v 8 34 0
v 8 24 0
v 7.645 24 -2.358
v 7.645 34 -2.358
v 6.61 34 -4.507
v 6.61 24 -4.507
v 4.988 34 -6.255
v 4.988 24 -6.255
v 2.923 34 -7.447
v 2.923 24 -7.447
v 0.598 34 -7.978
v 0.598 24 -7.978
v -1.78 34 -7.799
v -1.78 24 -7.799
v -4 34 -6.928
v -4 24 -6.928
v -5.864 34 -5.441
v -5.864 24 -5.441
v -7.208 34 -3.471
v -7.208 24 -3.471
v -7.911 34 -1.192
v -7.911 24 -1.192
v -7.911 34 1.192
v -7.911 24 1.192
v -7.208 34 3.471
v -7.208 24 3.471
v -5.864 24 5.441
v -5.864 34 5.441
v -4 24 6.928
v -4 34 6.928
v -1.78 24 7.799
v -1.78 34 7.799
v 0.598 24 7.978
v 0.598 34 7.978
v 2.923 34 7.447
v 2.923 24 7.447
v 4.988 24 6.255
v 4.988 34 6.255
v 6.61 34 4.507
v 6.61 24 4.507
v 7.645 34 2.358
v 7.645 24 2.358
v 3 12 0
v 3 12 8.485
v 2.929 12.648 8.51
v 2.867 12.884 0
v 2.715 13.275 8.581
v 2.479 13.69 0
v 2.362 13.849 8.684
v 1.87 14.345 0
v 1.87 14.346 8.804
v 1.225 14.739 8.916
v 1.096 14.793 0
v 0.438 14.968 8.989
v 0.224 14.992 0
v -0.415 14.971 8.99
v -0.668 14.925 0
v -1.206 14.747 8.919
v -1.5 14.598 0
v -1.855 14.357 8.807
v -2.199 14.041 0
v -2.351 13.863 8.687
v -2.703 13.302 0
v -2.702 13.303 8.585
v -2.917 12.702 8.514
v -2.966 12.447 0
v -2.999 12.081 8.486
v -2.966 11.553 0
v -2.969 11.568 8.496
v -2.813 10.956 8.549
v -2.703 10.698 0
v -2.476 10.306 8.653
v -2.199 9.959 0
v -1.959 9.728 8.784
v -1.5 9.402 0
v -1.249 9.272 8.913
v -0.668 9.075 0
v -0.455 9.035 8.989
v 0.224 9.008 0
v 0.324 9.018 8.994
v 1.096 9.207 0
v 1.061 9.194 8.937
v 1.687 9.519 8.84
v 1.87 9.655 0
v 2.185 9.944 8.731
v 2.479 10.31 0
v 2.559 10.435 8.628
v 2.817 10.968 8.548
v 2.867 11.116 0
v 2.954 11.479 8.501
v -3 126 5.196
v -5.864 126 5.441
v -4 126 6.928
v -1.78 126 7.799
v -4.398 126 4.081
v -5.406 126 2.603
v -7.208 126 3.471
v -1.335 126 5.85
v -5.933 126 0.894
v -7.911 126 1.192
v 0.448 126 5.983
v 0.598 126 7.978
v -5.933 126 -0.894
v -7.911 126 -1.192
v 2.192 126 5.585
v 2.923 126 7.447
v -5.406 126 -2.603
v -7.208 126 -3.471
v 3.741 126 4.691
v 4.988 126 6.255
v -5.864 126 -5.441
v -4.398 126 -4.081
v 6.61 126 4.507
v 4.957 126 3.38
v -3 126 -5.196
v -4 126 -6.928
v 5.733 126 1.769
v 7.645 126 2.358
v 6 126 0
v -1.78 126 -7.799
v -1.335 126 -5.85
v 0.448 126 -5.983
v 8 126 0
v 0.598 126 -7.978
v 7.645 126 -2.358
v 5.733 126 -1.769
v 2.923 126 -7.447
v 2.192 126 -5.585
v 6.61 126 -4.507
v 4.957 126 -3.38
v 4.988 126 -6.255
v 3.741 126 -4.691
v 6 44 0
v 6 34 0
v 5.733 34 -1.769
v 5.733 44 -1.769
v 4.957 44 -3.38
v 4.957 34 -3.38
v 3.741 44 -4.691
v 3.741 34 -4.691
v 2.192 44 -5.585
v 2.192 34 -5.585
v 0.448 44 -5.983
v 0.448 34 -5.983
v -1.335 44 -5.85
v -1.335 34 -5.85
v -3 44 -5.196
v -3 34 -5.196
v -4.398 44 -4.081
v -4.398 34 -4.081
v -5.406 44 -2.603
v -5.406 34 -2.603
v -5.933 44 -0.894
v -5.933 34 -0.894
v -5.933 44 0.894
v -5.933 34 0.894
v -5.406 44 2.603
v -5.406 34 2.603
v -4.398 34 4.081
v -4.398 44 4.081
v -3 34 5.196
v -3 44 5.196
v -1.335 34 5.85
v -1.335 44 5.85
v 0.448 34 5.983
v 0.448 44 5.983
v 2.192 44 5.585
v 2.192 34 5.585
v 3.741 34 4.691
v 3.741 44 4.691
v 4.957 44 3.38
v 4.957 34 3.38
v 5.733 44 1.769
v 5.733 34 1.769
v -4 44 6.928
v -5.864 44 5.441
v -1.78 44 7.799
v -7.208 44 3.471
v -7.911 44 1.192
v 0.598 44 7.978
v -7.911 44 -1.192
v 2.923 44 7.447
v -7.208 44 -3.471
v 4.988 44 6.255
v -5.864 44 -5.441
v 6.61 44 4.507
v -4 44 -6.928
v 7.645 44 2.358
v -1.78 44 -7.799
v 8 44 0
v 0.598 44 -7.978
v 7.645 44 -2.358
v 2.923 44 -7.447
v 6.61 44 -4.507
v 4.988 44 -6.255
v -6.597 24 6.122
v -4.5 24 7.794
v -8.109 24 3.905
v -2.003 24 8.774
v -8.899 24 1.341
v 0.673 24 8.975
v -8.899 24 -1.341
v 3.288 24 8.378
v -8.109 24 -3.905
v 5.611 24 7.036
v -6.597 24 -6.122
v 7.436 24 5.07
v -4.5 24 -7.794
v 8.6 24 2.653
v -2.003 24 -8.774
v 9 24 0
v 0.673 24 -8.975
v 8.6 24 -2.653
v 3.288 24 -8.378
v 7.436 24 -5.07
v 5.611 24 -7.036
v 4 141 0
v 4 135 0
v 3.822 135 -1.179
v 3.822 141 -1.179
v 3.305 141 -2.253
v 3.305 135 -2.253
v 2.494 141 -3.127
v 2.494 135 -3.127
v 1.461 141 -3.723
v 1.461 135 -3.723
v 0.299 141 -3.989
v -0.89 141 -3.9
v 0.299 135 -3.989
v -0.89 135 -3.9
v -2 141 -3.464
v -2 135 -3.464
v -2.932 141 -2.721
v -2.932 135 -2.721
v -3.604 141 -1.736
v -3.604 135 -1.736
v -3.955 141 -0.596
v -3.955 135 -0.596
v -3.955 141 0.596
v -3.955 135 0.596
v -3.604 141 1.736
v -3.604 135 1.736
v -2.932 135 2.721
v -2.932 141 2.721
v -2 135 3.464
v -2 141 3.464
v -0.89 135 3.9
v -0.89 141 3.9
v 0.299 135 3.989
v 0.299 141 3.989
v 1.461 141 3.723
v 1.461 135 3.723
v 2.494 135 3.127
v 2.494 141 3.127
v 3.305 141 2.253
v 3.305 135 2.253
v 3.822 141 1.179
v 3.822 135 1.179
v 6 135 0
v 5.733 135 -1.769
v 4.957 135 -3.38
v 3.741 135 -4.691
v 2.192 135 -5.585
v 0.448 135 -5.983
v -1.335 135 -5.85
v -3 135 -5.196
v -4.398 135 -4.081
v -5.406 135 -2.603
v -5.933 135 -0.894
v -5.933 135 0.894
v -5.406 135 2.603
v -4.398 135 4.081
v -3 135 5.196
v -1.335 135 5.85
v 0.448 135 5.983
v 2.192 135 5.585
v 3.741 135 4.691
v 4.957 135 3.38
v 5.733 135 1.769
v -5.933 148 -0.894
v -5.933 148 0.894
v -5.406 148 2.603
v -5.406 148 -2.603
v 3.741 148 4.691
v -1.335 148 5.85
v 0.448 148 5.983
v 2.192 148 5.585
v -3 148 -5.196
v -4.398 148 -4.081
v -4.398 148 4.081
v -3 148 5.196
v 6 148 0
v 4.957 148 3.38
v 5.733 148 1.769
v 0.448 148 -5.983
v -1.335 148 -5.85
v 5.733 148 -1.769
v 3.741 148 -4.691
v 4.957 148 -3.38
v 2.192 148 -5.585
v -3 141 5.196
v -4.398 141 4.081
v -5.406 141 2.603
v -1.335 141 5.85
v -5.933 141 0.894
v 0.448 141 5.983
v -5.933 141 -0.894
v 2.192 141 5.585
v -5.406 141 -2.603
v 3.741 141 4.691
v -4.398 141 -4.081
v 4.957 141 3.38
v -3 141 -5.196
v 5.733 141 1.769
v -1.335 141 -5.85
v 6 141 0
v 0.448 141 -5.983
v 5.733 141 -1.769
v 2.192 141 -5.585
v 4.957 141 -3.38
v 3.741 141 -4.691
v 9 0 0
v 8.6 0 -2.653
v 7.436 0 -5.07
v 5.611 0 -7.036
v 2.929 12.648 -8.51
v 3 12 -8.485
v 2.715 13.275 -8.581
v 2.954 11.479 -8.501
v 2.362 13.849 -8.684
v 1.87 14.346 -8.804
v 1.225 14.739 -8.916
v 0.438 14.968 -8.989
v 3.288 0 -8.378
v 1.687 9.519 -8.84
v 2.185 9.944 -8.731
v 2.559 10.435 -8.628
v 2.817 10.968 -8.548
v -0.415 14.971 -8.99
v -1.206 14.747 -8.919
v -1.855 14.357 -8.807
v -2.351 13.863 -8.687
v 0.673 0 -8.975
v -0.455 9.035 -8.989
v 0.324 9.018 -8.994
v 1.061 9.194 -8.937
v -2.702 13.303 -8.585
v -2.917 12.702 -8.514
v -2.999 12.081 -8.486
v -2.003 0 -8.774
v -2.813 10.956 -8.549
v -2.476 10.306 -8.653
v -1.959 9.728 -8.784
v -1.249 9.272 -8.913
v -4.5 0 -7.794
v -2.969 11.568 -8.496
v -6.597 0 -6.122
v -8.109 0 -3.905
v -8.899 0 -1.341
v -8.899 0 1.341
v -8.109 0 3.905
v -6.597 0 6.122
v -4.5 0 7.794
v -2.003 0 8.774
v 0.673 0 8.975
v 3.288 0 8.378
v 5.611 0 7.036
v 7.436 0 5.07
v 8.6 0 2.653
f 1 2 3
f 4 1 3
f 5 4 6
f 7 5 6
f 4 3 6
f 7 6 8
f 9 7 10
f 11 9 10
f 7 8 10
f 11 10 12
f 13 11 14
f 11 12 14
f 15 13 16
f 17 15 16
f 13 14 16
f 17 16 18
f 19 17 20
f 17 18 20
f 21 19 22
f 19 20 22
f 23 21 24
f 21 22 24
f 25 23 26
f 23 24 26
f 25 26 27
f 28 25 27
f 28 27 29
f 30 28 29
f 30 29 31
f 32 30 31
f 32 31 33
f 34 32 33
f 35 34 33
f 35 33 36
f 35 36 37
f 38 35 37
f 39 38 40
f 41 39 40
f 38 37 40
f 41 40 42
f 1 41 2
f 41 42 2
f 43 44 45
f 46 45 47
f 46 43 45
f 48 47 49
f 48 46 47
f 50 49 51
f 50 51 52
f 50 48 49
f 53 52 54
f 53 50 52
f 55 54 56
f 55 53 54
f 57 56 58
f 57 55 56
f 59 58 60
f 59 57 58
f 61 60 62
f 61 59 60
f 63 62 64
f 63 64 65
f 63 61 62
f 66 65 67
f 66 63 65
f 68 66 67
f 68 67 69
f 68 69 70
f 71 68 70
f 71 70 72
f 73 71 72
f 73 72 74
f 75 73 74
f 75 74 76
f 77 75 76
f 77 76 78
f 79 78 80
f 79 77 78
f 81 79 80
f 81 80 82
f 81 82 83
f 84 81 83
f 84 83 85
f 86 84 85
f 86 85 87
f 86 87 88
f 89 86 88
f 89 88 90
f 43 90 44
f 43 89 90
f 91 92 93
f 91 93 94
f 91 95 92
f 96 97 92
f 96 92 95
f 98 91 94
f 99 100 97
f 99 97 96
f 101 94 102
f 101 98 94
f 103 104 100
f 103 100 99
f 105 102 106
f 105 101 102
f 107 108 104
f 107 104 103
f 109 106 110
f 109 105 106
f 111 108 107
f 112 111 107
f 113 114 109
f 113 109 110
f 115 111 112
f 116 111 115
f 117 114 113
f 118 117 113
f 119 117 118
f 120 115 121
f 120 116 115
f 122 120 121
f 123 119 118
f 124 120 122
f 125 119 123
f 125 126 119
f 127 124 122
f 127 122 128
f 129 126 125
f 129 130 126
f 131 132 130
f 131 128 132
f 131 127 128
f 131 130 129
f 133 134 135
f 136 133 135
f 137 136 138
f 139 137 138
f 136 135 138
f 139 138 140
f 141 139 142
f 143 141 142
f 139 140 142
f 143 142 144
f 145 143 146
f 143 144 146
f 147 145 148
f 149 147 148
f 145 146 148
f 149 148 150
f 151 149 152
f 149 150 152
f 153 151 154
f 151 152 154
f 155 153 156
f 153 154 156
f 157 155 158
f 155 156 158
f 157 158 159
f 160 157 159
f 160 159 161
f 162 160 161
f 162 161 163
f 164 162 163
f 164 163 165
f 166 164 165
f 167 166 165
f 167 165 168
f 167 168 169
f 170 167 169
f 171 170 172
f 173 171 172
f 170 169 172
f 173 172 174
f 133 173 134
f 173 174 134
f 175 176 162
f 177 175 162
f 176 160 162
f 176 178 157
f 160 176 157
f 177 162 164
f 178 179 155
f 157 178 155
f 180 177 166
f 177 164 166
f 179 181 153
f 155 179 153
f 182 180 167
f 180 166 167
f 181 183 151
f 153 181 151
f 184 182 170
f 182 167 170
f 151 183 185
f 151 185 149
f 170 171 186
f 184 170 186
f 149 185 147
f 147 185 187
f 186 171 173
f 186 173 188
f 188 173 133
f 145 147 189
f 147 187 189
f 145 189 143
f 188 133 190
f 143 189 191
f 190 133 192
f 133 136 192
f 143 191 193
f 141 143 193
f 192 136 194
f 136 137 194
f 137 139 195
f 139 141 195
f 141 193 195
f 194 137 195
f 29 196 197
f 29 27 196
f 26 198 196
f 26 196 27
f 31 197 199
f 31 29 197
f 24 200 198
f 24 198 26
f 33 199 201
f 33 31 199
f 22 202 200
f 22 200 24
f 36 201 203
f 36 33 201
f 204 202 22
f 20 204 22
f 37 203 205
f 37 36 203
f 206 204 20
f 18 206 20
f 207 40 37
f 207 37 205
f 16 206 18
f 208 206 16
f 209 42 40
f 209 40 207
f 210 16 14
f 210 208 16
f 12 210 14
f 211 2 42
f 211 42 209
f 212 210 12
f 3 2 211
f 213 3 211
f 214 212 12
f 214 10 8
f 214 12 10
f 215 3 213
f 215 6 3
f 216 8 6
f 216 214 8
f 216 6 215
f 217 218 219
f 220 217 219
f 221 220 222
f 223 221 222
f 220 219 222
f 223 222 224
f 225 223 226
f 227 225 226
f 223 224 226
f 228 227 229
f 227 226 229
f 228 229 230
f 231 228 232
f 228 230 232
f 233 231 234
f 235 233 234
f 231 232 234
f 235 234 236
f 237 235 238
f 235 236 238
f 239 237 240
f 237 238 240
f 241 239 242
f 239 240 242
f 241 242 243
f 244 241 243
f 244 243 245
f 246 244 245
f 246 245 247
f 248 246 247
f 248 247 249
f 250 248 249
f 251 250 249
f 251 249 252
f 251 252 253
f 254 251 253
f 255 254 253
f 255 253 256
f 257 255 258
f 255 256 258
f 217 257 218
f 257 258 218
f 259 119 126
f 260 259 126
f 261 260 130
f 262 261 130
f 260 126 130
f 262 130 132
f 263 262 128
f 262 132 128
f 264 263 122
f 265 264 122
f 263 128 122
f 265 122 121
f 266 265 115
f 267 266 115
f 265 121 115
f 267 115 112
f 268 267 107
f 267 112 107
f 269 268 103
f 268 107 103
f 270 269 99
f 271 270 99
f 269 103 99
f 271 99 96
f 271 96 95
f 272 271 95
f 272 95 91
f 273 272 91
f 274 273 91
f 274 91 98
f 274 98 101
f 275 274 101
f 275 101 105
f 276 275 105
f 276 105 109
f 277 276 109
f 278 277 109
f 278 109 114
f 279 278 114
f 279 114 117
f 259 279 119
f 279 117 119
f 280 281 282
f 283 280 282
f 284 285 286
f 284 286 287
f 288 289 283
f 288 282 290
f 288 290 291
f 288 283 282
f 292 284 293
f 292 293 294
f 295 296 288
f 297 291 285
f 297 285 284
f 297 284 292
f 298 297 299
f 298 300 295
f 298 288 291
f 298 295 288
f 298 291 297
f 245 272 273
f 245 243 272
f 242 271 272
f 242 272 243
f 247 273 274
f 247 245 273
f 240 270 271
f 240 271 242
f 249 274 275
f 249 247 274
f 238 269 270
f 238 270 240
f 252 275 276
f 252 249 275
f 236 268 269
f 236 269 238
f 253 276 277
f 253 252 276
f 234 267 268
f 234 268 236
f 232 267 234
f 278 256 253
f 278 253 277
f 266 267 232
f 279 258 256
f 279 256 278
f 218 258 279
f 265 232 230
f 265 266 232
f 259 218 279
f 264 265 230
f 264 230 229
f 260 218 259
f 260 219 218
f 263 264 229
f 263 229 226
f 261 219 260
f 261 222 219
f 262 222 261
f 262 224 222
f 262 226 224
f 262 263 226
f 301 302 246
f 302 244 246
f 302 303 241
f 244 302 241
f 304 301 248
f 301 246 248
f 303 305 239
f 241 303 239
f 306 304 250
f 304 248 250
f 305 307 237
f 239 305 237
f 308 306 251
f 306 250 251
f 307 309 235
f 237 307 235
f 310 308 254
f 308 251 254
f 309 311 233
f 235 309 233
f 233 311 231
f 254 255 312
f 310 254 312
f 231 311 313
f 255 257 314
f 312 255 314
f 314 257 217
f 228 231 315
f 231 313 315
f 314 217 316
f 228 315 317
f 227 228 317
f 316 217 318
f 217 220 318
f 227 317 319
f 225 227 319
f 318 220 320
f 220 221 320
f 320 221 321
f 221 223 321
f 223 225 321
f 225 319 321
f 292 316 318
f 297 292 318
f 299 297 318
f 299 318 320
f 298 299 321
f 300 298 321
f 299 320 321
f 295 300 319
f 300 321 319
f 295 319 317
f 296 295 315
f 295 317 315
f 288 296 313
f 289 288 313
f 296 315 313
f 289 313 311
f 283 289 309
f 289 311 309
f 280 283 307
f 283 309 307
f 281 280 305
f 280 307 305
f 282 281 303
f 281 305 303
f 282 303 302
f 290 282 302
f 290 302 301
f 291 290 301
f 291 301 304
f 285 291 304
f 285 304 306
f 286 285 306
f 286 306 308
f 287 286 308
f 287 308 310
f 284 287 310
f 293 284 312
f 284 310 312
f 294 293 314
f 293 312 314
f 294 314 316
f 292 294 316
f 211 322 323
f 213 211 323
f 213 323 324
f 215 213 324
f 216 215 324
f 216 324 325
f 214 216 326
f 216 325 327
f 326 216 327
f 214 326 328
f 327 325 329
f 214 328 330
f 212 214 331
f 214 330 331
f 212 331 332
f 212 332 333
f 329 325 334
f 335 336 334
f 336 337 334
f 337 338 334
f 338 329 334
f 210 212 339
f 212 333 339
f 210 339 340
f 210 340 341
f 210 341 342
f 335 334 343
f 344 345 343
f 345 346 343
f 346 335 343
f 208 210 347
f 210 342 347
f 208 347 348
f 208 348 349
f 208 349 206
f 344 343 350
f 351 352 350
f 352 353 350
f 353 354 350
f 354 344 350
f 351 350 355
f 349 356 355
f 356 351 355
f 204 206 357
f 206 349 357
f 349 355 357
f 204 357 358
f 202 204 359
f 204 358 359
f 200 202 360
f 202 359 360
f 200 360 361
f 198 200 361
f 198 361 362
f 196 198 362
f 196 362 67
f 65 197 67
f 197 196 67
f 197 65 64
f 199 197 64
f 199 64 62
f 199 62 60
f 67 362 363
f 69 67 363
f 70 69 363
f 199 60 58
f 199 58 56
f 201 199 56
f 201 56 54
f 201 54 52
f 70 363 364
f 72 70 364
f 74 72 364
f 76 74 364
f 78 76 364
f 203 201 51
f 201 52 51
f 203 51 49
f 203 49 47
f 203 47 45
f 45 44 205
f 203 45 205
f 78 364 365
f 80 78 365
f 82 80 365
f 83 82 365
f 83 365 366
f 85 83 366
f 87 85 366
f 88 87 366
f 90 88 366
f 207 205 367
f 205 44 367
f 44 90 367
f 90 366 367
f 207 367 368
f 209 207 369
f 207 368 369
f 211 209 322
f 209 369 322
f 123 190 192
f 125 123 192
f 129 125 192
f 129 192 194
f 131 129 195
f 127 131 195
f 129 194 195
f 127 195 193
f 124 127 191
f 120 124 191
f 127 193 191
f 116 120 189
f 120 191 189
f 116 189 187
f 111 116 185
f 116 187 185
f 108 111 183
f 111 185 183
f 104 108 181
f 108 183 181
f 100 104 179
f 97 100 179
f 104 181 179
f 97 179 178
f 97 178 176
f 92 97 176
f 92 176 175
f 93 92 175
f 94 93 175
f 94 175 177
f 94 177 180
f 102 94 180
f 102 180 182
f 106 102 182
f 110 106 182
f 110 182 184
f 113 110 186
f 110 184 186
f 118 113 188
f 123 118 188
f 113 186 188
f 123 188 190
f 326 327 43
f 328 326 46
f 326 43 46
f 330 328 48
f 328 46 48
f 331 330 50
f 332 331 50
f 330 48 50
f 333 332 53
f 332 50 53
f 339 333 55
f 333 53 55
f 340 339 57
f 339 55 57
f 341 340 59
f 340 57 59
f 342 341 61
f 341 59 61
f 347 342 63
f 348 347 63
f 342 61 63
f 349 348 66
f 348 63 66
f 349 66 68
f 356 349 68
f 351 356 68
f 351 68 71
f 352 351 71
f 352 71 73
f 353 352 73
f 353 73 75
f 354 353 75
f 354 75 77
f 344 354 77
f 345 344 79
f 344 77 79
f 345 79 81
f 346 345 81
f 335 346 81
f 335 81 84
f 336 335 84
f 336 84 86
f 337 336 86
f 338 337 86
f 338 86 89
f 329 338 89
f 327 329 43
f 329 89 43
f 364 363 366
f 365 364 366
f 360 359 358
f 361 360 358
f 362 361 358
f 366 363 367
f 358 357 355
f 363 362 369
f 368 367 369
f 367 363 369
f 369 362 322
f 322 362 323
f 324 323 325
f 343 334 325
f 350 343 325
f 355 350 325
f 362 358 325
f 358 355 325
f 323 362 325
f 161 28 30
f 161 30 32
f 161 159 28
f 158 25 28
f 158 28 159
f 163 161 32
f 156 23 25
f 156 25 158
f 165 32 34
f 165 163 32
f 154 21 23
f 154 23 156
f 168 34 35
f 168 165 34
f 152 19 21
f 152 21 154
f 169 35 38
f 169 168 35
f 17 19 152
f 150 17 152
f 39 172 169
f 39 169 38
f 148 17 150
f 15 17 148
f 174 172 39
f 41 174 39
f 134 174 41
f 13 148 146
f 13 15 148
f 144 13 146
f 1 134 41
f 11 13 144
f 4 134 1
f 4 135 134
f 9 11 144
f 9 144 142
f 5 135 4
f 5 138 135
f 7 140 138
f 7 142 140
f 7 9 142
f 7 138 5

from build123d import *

# Parameters (mm, degrees)
SKETCH1_R               = 9
BOSS_EXTRUDE1_DEPTH     = 24
SKETCH2_R               = 8
BOSS_EXTRUDE2_DEPTH     = 10
SKETCH3_R               = 6
BOSS_EXTRUDE3_DEPTH     = 10
SKETCH4_R               = 8
BOSS_EXTRUDE4_DEPTH     = 82
SKETCH5_R               = 6
BOSS_EXTRUDE5_DEPTH     = 9
SKETCH6_R               = 4
BOSS_EXTRUDE6_DEPTH     = 6
SKETCH7_R               = 6
BOSS_EXTRUDE7_DEPTH     = 7
SKETCH8_R               = 3
CUT_EXTRUDE1_DEPTH      = 10
CUT_EXTRUDE1_DEPTH_BACK = 10


with BuildPart() as part:
    # Sketch1 → Boss-Extrude1 (new body)
    with BuildSketch(Plane(origin=(0, 0, 0), x_dir=(1, 0, 0), z_dir=(0, 1, 0))):
        Circle(SKETCH1_R)
    extrude(amount=BOSS_EXTRUDE1_DEPTH)

    # Sketch2 → Boss-Extrude2 (add)
    with BuildSketch(Plane(origin=(0, 24, 0), x_dir=(1, 0, 0), z_dir=(0, 1, 0))):
        Circle(SKETCH2_R)
    extrude(amount=BOSS_EXTRUDE2_DEPTH)

    # Sketch3 → Boss-Extrude3 (add)
    with BuildSketch(Plane(origin=(0, 34, 0), x_dir=(1, 0, 0), z_dir=(0, 1, 0))):
        Circle(SKETCH3_R)
    extrude(amount=BOSS_EXTRUDE3_DEPTH)

    # Sketch4 → Boss-Extrude4 (add)
    with BuildSketch(Plane(origin=(0, 44, 0), x_dir=(1, 0, 0), z_dir=(0, 1, 0))):
        Circle(SKETCH4_R)
    extrude(amount=BOSS_EXTRUDE4_DEPTH)

    # Sketch5 → Boss-Extrude5 (add)
    with BuildSketch(Plane(origin=(0, 126, 0), x_dir=(1, 0, 0), z_dir=(0, 1, 0))):
        Circle(SKETCH5_R)
    extrude(amount=BOSS_EXTRUDE5_DEPTH)

    # Sketch6 → Boss-Extrude6 (add)
    with BuildSketch(Plane(origin=(0, 135, 0), x_dir=(1, 0, 0), z_dir=(0, 1, 0))):
        Circle(SKETCH6_R)
    extrude(amount=BOSS_EXTRUDE6_DEPTH)

    # Sketch7 → Boss-Extrude7 (add)
    with BuildSketch(Plane(origin=(0, 141, 0), x_dir=(1, 0, 0), z_dir=(0, 1, 0))):
        Circle(SKETCH7_R)
    extrude(amount=BOSS_EXTRUDE7_DEPTH)

    # Sketch8 → Cut-Extrude1 (cut, two sides)
    with BuildSketch(Plane.XY) as cut_extrude1_sk:
        with Locations((0, 12)):
            Circle(SKETCH8_R)
    extrude(amount=CUT_EXTRUDE1_DEPTH, mode=Mode.SUBTRACT)
    extrude(cut_extrude1_sk.sketch, amount=-CUT_EXTRUDE1_DEPTH_BACK, mode=Mode.SUBTRACT)


solid = part.part
